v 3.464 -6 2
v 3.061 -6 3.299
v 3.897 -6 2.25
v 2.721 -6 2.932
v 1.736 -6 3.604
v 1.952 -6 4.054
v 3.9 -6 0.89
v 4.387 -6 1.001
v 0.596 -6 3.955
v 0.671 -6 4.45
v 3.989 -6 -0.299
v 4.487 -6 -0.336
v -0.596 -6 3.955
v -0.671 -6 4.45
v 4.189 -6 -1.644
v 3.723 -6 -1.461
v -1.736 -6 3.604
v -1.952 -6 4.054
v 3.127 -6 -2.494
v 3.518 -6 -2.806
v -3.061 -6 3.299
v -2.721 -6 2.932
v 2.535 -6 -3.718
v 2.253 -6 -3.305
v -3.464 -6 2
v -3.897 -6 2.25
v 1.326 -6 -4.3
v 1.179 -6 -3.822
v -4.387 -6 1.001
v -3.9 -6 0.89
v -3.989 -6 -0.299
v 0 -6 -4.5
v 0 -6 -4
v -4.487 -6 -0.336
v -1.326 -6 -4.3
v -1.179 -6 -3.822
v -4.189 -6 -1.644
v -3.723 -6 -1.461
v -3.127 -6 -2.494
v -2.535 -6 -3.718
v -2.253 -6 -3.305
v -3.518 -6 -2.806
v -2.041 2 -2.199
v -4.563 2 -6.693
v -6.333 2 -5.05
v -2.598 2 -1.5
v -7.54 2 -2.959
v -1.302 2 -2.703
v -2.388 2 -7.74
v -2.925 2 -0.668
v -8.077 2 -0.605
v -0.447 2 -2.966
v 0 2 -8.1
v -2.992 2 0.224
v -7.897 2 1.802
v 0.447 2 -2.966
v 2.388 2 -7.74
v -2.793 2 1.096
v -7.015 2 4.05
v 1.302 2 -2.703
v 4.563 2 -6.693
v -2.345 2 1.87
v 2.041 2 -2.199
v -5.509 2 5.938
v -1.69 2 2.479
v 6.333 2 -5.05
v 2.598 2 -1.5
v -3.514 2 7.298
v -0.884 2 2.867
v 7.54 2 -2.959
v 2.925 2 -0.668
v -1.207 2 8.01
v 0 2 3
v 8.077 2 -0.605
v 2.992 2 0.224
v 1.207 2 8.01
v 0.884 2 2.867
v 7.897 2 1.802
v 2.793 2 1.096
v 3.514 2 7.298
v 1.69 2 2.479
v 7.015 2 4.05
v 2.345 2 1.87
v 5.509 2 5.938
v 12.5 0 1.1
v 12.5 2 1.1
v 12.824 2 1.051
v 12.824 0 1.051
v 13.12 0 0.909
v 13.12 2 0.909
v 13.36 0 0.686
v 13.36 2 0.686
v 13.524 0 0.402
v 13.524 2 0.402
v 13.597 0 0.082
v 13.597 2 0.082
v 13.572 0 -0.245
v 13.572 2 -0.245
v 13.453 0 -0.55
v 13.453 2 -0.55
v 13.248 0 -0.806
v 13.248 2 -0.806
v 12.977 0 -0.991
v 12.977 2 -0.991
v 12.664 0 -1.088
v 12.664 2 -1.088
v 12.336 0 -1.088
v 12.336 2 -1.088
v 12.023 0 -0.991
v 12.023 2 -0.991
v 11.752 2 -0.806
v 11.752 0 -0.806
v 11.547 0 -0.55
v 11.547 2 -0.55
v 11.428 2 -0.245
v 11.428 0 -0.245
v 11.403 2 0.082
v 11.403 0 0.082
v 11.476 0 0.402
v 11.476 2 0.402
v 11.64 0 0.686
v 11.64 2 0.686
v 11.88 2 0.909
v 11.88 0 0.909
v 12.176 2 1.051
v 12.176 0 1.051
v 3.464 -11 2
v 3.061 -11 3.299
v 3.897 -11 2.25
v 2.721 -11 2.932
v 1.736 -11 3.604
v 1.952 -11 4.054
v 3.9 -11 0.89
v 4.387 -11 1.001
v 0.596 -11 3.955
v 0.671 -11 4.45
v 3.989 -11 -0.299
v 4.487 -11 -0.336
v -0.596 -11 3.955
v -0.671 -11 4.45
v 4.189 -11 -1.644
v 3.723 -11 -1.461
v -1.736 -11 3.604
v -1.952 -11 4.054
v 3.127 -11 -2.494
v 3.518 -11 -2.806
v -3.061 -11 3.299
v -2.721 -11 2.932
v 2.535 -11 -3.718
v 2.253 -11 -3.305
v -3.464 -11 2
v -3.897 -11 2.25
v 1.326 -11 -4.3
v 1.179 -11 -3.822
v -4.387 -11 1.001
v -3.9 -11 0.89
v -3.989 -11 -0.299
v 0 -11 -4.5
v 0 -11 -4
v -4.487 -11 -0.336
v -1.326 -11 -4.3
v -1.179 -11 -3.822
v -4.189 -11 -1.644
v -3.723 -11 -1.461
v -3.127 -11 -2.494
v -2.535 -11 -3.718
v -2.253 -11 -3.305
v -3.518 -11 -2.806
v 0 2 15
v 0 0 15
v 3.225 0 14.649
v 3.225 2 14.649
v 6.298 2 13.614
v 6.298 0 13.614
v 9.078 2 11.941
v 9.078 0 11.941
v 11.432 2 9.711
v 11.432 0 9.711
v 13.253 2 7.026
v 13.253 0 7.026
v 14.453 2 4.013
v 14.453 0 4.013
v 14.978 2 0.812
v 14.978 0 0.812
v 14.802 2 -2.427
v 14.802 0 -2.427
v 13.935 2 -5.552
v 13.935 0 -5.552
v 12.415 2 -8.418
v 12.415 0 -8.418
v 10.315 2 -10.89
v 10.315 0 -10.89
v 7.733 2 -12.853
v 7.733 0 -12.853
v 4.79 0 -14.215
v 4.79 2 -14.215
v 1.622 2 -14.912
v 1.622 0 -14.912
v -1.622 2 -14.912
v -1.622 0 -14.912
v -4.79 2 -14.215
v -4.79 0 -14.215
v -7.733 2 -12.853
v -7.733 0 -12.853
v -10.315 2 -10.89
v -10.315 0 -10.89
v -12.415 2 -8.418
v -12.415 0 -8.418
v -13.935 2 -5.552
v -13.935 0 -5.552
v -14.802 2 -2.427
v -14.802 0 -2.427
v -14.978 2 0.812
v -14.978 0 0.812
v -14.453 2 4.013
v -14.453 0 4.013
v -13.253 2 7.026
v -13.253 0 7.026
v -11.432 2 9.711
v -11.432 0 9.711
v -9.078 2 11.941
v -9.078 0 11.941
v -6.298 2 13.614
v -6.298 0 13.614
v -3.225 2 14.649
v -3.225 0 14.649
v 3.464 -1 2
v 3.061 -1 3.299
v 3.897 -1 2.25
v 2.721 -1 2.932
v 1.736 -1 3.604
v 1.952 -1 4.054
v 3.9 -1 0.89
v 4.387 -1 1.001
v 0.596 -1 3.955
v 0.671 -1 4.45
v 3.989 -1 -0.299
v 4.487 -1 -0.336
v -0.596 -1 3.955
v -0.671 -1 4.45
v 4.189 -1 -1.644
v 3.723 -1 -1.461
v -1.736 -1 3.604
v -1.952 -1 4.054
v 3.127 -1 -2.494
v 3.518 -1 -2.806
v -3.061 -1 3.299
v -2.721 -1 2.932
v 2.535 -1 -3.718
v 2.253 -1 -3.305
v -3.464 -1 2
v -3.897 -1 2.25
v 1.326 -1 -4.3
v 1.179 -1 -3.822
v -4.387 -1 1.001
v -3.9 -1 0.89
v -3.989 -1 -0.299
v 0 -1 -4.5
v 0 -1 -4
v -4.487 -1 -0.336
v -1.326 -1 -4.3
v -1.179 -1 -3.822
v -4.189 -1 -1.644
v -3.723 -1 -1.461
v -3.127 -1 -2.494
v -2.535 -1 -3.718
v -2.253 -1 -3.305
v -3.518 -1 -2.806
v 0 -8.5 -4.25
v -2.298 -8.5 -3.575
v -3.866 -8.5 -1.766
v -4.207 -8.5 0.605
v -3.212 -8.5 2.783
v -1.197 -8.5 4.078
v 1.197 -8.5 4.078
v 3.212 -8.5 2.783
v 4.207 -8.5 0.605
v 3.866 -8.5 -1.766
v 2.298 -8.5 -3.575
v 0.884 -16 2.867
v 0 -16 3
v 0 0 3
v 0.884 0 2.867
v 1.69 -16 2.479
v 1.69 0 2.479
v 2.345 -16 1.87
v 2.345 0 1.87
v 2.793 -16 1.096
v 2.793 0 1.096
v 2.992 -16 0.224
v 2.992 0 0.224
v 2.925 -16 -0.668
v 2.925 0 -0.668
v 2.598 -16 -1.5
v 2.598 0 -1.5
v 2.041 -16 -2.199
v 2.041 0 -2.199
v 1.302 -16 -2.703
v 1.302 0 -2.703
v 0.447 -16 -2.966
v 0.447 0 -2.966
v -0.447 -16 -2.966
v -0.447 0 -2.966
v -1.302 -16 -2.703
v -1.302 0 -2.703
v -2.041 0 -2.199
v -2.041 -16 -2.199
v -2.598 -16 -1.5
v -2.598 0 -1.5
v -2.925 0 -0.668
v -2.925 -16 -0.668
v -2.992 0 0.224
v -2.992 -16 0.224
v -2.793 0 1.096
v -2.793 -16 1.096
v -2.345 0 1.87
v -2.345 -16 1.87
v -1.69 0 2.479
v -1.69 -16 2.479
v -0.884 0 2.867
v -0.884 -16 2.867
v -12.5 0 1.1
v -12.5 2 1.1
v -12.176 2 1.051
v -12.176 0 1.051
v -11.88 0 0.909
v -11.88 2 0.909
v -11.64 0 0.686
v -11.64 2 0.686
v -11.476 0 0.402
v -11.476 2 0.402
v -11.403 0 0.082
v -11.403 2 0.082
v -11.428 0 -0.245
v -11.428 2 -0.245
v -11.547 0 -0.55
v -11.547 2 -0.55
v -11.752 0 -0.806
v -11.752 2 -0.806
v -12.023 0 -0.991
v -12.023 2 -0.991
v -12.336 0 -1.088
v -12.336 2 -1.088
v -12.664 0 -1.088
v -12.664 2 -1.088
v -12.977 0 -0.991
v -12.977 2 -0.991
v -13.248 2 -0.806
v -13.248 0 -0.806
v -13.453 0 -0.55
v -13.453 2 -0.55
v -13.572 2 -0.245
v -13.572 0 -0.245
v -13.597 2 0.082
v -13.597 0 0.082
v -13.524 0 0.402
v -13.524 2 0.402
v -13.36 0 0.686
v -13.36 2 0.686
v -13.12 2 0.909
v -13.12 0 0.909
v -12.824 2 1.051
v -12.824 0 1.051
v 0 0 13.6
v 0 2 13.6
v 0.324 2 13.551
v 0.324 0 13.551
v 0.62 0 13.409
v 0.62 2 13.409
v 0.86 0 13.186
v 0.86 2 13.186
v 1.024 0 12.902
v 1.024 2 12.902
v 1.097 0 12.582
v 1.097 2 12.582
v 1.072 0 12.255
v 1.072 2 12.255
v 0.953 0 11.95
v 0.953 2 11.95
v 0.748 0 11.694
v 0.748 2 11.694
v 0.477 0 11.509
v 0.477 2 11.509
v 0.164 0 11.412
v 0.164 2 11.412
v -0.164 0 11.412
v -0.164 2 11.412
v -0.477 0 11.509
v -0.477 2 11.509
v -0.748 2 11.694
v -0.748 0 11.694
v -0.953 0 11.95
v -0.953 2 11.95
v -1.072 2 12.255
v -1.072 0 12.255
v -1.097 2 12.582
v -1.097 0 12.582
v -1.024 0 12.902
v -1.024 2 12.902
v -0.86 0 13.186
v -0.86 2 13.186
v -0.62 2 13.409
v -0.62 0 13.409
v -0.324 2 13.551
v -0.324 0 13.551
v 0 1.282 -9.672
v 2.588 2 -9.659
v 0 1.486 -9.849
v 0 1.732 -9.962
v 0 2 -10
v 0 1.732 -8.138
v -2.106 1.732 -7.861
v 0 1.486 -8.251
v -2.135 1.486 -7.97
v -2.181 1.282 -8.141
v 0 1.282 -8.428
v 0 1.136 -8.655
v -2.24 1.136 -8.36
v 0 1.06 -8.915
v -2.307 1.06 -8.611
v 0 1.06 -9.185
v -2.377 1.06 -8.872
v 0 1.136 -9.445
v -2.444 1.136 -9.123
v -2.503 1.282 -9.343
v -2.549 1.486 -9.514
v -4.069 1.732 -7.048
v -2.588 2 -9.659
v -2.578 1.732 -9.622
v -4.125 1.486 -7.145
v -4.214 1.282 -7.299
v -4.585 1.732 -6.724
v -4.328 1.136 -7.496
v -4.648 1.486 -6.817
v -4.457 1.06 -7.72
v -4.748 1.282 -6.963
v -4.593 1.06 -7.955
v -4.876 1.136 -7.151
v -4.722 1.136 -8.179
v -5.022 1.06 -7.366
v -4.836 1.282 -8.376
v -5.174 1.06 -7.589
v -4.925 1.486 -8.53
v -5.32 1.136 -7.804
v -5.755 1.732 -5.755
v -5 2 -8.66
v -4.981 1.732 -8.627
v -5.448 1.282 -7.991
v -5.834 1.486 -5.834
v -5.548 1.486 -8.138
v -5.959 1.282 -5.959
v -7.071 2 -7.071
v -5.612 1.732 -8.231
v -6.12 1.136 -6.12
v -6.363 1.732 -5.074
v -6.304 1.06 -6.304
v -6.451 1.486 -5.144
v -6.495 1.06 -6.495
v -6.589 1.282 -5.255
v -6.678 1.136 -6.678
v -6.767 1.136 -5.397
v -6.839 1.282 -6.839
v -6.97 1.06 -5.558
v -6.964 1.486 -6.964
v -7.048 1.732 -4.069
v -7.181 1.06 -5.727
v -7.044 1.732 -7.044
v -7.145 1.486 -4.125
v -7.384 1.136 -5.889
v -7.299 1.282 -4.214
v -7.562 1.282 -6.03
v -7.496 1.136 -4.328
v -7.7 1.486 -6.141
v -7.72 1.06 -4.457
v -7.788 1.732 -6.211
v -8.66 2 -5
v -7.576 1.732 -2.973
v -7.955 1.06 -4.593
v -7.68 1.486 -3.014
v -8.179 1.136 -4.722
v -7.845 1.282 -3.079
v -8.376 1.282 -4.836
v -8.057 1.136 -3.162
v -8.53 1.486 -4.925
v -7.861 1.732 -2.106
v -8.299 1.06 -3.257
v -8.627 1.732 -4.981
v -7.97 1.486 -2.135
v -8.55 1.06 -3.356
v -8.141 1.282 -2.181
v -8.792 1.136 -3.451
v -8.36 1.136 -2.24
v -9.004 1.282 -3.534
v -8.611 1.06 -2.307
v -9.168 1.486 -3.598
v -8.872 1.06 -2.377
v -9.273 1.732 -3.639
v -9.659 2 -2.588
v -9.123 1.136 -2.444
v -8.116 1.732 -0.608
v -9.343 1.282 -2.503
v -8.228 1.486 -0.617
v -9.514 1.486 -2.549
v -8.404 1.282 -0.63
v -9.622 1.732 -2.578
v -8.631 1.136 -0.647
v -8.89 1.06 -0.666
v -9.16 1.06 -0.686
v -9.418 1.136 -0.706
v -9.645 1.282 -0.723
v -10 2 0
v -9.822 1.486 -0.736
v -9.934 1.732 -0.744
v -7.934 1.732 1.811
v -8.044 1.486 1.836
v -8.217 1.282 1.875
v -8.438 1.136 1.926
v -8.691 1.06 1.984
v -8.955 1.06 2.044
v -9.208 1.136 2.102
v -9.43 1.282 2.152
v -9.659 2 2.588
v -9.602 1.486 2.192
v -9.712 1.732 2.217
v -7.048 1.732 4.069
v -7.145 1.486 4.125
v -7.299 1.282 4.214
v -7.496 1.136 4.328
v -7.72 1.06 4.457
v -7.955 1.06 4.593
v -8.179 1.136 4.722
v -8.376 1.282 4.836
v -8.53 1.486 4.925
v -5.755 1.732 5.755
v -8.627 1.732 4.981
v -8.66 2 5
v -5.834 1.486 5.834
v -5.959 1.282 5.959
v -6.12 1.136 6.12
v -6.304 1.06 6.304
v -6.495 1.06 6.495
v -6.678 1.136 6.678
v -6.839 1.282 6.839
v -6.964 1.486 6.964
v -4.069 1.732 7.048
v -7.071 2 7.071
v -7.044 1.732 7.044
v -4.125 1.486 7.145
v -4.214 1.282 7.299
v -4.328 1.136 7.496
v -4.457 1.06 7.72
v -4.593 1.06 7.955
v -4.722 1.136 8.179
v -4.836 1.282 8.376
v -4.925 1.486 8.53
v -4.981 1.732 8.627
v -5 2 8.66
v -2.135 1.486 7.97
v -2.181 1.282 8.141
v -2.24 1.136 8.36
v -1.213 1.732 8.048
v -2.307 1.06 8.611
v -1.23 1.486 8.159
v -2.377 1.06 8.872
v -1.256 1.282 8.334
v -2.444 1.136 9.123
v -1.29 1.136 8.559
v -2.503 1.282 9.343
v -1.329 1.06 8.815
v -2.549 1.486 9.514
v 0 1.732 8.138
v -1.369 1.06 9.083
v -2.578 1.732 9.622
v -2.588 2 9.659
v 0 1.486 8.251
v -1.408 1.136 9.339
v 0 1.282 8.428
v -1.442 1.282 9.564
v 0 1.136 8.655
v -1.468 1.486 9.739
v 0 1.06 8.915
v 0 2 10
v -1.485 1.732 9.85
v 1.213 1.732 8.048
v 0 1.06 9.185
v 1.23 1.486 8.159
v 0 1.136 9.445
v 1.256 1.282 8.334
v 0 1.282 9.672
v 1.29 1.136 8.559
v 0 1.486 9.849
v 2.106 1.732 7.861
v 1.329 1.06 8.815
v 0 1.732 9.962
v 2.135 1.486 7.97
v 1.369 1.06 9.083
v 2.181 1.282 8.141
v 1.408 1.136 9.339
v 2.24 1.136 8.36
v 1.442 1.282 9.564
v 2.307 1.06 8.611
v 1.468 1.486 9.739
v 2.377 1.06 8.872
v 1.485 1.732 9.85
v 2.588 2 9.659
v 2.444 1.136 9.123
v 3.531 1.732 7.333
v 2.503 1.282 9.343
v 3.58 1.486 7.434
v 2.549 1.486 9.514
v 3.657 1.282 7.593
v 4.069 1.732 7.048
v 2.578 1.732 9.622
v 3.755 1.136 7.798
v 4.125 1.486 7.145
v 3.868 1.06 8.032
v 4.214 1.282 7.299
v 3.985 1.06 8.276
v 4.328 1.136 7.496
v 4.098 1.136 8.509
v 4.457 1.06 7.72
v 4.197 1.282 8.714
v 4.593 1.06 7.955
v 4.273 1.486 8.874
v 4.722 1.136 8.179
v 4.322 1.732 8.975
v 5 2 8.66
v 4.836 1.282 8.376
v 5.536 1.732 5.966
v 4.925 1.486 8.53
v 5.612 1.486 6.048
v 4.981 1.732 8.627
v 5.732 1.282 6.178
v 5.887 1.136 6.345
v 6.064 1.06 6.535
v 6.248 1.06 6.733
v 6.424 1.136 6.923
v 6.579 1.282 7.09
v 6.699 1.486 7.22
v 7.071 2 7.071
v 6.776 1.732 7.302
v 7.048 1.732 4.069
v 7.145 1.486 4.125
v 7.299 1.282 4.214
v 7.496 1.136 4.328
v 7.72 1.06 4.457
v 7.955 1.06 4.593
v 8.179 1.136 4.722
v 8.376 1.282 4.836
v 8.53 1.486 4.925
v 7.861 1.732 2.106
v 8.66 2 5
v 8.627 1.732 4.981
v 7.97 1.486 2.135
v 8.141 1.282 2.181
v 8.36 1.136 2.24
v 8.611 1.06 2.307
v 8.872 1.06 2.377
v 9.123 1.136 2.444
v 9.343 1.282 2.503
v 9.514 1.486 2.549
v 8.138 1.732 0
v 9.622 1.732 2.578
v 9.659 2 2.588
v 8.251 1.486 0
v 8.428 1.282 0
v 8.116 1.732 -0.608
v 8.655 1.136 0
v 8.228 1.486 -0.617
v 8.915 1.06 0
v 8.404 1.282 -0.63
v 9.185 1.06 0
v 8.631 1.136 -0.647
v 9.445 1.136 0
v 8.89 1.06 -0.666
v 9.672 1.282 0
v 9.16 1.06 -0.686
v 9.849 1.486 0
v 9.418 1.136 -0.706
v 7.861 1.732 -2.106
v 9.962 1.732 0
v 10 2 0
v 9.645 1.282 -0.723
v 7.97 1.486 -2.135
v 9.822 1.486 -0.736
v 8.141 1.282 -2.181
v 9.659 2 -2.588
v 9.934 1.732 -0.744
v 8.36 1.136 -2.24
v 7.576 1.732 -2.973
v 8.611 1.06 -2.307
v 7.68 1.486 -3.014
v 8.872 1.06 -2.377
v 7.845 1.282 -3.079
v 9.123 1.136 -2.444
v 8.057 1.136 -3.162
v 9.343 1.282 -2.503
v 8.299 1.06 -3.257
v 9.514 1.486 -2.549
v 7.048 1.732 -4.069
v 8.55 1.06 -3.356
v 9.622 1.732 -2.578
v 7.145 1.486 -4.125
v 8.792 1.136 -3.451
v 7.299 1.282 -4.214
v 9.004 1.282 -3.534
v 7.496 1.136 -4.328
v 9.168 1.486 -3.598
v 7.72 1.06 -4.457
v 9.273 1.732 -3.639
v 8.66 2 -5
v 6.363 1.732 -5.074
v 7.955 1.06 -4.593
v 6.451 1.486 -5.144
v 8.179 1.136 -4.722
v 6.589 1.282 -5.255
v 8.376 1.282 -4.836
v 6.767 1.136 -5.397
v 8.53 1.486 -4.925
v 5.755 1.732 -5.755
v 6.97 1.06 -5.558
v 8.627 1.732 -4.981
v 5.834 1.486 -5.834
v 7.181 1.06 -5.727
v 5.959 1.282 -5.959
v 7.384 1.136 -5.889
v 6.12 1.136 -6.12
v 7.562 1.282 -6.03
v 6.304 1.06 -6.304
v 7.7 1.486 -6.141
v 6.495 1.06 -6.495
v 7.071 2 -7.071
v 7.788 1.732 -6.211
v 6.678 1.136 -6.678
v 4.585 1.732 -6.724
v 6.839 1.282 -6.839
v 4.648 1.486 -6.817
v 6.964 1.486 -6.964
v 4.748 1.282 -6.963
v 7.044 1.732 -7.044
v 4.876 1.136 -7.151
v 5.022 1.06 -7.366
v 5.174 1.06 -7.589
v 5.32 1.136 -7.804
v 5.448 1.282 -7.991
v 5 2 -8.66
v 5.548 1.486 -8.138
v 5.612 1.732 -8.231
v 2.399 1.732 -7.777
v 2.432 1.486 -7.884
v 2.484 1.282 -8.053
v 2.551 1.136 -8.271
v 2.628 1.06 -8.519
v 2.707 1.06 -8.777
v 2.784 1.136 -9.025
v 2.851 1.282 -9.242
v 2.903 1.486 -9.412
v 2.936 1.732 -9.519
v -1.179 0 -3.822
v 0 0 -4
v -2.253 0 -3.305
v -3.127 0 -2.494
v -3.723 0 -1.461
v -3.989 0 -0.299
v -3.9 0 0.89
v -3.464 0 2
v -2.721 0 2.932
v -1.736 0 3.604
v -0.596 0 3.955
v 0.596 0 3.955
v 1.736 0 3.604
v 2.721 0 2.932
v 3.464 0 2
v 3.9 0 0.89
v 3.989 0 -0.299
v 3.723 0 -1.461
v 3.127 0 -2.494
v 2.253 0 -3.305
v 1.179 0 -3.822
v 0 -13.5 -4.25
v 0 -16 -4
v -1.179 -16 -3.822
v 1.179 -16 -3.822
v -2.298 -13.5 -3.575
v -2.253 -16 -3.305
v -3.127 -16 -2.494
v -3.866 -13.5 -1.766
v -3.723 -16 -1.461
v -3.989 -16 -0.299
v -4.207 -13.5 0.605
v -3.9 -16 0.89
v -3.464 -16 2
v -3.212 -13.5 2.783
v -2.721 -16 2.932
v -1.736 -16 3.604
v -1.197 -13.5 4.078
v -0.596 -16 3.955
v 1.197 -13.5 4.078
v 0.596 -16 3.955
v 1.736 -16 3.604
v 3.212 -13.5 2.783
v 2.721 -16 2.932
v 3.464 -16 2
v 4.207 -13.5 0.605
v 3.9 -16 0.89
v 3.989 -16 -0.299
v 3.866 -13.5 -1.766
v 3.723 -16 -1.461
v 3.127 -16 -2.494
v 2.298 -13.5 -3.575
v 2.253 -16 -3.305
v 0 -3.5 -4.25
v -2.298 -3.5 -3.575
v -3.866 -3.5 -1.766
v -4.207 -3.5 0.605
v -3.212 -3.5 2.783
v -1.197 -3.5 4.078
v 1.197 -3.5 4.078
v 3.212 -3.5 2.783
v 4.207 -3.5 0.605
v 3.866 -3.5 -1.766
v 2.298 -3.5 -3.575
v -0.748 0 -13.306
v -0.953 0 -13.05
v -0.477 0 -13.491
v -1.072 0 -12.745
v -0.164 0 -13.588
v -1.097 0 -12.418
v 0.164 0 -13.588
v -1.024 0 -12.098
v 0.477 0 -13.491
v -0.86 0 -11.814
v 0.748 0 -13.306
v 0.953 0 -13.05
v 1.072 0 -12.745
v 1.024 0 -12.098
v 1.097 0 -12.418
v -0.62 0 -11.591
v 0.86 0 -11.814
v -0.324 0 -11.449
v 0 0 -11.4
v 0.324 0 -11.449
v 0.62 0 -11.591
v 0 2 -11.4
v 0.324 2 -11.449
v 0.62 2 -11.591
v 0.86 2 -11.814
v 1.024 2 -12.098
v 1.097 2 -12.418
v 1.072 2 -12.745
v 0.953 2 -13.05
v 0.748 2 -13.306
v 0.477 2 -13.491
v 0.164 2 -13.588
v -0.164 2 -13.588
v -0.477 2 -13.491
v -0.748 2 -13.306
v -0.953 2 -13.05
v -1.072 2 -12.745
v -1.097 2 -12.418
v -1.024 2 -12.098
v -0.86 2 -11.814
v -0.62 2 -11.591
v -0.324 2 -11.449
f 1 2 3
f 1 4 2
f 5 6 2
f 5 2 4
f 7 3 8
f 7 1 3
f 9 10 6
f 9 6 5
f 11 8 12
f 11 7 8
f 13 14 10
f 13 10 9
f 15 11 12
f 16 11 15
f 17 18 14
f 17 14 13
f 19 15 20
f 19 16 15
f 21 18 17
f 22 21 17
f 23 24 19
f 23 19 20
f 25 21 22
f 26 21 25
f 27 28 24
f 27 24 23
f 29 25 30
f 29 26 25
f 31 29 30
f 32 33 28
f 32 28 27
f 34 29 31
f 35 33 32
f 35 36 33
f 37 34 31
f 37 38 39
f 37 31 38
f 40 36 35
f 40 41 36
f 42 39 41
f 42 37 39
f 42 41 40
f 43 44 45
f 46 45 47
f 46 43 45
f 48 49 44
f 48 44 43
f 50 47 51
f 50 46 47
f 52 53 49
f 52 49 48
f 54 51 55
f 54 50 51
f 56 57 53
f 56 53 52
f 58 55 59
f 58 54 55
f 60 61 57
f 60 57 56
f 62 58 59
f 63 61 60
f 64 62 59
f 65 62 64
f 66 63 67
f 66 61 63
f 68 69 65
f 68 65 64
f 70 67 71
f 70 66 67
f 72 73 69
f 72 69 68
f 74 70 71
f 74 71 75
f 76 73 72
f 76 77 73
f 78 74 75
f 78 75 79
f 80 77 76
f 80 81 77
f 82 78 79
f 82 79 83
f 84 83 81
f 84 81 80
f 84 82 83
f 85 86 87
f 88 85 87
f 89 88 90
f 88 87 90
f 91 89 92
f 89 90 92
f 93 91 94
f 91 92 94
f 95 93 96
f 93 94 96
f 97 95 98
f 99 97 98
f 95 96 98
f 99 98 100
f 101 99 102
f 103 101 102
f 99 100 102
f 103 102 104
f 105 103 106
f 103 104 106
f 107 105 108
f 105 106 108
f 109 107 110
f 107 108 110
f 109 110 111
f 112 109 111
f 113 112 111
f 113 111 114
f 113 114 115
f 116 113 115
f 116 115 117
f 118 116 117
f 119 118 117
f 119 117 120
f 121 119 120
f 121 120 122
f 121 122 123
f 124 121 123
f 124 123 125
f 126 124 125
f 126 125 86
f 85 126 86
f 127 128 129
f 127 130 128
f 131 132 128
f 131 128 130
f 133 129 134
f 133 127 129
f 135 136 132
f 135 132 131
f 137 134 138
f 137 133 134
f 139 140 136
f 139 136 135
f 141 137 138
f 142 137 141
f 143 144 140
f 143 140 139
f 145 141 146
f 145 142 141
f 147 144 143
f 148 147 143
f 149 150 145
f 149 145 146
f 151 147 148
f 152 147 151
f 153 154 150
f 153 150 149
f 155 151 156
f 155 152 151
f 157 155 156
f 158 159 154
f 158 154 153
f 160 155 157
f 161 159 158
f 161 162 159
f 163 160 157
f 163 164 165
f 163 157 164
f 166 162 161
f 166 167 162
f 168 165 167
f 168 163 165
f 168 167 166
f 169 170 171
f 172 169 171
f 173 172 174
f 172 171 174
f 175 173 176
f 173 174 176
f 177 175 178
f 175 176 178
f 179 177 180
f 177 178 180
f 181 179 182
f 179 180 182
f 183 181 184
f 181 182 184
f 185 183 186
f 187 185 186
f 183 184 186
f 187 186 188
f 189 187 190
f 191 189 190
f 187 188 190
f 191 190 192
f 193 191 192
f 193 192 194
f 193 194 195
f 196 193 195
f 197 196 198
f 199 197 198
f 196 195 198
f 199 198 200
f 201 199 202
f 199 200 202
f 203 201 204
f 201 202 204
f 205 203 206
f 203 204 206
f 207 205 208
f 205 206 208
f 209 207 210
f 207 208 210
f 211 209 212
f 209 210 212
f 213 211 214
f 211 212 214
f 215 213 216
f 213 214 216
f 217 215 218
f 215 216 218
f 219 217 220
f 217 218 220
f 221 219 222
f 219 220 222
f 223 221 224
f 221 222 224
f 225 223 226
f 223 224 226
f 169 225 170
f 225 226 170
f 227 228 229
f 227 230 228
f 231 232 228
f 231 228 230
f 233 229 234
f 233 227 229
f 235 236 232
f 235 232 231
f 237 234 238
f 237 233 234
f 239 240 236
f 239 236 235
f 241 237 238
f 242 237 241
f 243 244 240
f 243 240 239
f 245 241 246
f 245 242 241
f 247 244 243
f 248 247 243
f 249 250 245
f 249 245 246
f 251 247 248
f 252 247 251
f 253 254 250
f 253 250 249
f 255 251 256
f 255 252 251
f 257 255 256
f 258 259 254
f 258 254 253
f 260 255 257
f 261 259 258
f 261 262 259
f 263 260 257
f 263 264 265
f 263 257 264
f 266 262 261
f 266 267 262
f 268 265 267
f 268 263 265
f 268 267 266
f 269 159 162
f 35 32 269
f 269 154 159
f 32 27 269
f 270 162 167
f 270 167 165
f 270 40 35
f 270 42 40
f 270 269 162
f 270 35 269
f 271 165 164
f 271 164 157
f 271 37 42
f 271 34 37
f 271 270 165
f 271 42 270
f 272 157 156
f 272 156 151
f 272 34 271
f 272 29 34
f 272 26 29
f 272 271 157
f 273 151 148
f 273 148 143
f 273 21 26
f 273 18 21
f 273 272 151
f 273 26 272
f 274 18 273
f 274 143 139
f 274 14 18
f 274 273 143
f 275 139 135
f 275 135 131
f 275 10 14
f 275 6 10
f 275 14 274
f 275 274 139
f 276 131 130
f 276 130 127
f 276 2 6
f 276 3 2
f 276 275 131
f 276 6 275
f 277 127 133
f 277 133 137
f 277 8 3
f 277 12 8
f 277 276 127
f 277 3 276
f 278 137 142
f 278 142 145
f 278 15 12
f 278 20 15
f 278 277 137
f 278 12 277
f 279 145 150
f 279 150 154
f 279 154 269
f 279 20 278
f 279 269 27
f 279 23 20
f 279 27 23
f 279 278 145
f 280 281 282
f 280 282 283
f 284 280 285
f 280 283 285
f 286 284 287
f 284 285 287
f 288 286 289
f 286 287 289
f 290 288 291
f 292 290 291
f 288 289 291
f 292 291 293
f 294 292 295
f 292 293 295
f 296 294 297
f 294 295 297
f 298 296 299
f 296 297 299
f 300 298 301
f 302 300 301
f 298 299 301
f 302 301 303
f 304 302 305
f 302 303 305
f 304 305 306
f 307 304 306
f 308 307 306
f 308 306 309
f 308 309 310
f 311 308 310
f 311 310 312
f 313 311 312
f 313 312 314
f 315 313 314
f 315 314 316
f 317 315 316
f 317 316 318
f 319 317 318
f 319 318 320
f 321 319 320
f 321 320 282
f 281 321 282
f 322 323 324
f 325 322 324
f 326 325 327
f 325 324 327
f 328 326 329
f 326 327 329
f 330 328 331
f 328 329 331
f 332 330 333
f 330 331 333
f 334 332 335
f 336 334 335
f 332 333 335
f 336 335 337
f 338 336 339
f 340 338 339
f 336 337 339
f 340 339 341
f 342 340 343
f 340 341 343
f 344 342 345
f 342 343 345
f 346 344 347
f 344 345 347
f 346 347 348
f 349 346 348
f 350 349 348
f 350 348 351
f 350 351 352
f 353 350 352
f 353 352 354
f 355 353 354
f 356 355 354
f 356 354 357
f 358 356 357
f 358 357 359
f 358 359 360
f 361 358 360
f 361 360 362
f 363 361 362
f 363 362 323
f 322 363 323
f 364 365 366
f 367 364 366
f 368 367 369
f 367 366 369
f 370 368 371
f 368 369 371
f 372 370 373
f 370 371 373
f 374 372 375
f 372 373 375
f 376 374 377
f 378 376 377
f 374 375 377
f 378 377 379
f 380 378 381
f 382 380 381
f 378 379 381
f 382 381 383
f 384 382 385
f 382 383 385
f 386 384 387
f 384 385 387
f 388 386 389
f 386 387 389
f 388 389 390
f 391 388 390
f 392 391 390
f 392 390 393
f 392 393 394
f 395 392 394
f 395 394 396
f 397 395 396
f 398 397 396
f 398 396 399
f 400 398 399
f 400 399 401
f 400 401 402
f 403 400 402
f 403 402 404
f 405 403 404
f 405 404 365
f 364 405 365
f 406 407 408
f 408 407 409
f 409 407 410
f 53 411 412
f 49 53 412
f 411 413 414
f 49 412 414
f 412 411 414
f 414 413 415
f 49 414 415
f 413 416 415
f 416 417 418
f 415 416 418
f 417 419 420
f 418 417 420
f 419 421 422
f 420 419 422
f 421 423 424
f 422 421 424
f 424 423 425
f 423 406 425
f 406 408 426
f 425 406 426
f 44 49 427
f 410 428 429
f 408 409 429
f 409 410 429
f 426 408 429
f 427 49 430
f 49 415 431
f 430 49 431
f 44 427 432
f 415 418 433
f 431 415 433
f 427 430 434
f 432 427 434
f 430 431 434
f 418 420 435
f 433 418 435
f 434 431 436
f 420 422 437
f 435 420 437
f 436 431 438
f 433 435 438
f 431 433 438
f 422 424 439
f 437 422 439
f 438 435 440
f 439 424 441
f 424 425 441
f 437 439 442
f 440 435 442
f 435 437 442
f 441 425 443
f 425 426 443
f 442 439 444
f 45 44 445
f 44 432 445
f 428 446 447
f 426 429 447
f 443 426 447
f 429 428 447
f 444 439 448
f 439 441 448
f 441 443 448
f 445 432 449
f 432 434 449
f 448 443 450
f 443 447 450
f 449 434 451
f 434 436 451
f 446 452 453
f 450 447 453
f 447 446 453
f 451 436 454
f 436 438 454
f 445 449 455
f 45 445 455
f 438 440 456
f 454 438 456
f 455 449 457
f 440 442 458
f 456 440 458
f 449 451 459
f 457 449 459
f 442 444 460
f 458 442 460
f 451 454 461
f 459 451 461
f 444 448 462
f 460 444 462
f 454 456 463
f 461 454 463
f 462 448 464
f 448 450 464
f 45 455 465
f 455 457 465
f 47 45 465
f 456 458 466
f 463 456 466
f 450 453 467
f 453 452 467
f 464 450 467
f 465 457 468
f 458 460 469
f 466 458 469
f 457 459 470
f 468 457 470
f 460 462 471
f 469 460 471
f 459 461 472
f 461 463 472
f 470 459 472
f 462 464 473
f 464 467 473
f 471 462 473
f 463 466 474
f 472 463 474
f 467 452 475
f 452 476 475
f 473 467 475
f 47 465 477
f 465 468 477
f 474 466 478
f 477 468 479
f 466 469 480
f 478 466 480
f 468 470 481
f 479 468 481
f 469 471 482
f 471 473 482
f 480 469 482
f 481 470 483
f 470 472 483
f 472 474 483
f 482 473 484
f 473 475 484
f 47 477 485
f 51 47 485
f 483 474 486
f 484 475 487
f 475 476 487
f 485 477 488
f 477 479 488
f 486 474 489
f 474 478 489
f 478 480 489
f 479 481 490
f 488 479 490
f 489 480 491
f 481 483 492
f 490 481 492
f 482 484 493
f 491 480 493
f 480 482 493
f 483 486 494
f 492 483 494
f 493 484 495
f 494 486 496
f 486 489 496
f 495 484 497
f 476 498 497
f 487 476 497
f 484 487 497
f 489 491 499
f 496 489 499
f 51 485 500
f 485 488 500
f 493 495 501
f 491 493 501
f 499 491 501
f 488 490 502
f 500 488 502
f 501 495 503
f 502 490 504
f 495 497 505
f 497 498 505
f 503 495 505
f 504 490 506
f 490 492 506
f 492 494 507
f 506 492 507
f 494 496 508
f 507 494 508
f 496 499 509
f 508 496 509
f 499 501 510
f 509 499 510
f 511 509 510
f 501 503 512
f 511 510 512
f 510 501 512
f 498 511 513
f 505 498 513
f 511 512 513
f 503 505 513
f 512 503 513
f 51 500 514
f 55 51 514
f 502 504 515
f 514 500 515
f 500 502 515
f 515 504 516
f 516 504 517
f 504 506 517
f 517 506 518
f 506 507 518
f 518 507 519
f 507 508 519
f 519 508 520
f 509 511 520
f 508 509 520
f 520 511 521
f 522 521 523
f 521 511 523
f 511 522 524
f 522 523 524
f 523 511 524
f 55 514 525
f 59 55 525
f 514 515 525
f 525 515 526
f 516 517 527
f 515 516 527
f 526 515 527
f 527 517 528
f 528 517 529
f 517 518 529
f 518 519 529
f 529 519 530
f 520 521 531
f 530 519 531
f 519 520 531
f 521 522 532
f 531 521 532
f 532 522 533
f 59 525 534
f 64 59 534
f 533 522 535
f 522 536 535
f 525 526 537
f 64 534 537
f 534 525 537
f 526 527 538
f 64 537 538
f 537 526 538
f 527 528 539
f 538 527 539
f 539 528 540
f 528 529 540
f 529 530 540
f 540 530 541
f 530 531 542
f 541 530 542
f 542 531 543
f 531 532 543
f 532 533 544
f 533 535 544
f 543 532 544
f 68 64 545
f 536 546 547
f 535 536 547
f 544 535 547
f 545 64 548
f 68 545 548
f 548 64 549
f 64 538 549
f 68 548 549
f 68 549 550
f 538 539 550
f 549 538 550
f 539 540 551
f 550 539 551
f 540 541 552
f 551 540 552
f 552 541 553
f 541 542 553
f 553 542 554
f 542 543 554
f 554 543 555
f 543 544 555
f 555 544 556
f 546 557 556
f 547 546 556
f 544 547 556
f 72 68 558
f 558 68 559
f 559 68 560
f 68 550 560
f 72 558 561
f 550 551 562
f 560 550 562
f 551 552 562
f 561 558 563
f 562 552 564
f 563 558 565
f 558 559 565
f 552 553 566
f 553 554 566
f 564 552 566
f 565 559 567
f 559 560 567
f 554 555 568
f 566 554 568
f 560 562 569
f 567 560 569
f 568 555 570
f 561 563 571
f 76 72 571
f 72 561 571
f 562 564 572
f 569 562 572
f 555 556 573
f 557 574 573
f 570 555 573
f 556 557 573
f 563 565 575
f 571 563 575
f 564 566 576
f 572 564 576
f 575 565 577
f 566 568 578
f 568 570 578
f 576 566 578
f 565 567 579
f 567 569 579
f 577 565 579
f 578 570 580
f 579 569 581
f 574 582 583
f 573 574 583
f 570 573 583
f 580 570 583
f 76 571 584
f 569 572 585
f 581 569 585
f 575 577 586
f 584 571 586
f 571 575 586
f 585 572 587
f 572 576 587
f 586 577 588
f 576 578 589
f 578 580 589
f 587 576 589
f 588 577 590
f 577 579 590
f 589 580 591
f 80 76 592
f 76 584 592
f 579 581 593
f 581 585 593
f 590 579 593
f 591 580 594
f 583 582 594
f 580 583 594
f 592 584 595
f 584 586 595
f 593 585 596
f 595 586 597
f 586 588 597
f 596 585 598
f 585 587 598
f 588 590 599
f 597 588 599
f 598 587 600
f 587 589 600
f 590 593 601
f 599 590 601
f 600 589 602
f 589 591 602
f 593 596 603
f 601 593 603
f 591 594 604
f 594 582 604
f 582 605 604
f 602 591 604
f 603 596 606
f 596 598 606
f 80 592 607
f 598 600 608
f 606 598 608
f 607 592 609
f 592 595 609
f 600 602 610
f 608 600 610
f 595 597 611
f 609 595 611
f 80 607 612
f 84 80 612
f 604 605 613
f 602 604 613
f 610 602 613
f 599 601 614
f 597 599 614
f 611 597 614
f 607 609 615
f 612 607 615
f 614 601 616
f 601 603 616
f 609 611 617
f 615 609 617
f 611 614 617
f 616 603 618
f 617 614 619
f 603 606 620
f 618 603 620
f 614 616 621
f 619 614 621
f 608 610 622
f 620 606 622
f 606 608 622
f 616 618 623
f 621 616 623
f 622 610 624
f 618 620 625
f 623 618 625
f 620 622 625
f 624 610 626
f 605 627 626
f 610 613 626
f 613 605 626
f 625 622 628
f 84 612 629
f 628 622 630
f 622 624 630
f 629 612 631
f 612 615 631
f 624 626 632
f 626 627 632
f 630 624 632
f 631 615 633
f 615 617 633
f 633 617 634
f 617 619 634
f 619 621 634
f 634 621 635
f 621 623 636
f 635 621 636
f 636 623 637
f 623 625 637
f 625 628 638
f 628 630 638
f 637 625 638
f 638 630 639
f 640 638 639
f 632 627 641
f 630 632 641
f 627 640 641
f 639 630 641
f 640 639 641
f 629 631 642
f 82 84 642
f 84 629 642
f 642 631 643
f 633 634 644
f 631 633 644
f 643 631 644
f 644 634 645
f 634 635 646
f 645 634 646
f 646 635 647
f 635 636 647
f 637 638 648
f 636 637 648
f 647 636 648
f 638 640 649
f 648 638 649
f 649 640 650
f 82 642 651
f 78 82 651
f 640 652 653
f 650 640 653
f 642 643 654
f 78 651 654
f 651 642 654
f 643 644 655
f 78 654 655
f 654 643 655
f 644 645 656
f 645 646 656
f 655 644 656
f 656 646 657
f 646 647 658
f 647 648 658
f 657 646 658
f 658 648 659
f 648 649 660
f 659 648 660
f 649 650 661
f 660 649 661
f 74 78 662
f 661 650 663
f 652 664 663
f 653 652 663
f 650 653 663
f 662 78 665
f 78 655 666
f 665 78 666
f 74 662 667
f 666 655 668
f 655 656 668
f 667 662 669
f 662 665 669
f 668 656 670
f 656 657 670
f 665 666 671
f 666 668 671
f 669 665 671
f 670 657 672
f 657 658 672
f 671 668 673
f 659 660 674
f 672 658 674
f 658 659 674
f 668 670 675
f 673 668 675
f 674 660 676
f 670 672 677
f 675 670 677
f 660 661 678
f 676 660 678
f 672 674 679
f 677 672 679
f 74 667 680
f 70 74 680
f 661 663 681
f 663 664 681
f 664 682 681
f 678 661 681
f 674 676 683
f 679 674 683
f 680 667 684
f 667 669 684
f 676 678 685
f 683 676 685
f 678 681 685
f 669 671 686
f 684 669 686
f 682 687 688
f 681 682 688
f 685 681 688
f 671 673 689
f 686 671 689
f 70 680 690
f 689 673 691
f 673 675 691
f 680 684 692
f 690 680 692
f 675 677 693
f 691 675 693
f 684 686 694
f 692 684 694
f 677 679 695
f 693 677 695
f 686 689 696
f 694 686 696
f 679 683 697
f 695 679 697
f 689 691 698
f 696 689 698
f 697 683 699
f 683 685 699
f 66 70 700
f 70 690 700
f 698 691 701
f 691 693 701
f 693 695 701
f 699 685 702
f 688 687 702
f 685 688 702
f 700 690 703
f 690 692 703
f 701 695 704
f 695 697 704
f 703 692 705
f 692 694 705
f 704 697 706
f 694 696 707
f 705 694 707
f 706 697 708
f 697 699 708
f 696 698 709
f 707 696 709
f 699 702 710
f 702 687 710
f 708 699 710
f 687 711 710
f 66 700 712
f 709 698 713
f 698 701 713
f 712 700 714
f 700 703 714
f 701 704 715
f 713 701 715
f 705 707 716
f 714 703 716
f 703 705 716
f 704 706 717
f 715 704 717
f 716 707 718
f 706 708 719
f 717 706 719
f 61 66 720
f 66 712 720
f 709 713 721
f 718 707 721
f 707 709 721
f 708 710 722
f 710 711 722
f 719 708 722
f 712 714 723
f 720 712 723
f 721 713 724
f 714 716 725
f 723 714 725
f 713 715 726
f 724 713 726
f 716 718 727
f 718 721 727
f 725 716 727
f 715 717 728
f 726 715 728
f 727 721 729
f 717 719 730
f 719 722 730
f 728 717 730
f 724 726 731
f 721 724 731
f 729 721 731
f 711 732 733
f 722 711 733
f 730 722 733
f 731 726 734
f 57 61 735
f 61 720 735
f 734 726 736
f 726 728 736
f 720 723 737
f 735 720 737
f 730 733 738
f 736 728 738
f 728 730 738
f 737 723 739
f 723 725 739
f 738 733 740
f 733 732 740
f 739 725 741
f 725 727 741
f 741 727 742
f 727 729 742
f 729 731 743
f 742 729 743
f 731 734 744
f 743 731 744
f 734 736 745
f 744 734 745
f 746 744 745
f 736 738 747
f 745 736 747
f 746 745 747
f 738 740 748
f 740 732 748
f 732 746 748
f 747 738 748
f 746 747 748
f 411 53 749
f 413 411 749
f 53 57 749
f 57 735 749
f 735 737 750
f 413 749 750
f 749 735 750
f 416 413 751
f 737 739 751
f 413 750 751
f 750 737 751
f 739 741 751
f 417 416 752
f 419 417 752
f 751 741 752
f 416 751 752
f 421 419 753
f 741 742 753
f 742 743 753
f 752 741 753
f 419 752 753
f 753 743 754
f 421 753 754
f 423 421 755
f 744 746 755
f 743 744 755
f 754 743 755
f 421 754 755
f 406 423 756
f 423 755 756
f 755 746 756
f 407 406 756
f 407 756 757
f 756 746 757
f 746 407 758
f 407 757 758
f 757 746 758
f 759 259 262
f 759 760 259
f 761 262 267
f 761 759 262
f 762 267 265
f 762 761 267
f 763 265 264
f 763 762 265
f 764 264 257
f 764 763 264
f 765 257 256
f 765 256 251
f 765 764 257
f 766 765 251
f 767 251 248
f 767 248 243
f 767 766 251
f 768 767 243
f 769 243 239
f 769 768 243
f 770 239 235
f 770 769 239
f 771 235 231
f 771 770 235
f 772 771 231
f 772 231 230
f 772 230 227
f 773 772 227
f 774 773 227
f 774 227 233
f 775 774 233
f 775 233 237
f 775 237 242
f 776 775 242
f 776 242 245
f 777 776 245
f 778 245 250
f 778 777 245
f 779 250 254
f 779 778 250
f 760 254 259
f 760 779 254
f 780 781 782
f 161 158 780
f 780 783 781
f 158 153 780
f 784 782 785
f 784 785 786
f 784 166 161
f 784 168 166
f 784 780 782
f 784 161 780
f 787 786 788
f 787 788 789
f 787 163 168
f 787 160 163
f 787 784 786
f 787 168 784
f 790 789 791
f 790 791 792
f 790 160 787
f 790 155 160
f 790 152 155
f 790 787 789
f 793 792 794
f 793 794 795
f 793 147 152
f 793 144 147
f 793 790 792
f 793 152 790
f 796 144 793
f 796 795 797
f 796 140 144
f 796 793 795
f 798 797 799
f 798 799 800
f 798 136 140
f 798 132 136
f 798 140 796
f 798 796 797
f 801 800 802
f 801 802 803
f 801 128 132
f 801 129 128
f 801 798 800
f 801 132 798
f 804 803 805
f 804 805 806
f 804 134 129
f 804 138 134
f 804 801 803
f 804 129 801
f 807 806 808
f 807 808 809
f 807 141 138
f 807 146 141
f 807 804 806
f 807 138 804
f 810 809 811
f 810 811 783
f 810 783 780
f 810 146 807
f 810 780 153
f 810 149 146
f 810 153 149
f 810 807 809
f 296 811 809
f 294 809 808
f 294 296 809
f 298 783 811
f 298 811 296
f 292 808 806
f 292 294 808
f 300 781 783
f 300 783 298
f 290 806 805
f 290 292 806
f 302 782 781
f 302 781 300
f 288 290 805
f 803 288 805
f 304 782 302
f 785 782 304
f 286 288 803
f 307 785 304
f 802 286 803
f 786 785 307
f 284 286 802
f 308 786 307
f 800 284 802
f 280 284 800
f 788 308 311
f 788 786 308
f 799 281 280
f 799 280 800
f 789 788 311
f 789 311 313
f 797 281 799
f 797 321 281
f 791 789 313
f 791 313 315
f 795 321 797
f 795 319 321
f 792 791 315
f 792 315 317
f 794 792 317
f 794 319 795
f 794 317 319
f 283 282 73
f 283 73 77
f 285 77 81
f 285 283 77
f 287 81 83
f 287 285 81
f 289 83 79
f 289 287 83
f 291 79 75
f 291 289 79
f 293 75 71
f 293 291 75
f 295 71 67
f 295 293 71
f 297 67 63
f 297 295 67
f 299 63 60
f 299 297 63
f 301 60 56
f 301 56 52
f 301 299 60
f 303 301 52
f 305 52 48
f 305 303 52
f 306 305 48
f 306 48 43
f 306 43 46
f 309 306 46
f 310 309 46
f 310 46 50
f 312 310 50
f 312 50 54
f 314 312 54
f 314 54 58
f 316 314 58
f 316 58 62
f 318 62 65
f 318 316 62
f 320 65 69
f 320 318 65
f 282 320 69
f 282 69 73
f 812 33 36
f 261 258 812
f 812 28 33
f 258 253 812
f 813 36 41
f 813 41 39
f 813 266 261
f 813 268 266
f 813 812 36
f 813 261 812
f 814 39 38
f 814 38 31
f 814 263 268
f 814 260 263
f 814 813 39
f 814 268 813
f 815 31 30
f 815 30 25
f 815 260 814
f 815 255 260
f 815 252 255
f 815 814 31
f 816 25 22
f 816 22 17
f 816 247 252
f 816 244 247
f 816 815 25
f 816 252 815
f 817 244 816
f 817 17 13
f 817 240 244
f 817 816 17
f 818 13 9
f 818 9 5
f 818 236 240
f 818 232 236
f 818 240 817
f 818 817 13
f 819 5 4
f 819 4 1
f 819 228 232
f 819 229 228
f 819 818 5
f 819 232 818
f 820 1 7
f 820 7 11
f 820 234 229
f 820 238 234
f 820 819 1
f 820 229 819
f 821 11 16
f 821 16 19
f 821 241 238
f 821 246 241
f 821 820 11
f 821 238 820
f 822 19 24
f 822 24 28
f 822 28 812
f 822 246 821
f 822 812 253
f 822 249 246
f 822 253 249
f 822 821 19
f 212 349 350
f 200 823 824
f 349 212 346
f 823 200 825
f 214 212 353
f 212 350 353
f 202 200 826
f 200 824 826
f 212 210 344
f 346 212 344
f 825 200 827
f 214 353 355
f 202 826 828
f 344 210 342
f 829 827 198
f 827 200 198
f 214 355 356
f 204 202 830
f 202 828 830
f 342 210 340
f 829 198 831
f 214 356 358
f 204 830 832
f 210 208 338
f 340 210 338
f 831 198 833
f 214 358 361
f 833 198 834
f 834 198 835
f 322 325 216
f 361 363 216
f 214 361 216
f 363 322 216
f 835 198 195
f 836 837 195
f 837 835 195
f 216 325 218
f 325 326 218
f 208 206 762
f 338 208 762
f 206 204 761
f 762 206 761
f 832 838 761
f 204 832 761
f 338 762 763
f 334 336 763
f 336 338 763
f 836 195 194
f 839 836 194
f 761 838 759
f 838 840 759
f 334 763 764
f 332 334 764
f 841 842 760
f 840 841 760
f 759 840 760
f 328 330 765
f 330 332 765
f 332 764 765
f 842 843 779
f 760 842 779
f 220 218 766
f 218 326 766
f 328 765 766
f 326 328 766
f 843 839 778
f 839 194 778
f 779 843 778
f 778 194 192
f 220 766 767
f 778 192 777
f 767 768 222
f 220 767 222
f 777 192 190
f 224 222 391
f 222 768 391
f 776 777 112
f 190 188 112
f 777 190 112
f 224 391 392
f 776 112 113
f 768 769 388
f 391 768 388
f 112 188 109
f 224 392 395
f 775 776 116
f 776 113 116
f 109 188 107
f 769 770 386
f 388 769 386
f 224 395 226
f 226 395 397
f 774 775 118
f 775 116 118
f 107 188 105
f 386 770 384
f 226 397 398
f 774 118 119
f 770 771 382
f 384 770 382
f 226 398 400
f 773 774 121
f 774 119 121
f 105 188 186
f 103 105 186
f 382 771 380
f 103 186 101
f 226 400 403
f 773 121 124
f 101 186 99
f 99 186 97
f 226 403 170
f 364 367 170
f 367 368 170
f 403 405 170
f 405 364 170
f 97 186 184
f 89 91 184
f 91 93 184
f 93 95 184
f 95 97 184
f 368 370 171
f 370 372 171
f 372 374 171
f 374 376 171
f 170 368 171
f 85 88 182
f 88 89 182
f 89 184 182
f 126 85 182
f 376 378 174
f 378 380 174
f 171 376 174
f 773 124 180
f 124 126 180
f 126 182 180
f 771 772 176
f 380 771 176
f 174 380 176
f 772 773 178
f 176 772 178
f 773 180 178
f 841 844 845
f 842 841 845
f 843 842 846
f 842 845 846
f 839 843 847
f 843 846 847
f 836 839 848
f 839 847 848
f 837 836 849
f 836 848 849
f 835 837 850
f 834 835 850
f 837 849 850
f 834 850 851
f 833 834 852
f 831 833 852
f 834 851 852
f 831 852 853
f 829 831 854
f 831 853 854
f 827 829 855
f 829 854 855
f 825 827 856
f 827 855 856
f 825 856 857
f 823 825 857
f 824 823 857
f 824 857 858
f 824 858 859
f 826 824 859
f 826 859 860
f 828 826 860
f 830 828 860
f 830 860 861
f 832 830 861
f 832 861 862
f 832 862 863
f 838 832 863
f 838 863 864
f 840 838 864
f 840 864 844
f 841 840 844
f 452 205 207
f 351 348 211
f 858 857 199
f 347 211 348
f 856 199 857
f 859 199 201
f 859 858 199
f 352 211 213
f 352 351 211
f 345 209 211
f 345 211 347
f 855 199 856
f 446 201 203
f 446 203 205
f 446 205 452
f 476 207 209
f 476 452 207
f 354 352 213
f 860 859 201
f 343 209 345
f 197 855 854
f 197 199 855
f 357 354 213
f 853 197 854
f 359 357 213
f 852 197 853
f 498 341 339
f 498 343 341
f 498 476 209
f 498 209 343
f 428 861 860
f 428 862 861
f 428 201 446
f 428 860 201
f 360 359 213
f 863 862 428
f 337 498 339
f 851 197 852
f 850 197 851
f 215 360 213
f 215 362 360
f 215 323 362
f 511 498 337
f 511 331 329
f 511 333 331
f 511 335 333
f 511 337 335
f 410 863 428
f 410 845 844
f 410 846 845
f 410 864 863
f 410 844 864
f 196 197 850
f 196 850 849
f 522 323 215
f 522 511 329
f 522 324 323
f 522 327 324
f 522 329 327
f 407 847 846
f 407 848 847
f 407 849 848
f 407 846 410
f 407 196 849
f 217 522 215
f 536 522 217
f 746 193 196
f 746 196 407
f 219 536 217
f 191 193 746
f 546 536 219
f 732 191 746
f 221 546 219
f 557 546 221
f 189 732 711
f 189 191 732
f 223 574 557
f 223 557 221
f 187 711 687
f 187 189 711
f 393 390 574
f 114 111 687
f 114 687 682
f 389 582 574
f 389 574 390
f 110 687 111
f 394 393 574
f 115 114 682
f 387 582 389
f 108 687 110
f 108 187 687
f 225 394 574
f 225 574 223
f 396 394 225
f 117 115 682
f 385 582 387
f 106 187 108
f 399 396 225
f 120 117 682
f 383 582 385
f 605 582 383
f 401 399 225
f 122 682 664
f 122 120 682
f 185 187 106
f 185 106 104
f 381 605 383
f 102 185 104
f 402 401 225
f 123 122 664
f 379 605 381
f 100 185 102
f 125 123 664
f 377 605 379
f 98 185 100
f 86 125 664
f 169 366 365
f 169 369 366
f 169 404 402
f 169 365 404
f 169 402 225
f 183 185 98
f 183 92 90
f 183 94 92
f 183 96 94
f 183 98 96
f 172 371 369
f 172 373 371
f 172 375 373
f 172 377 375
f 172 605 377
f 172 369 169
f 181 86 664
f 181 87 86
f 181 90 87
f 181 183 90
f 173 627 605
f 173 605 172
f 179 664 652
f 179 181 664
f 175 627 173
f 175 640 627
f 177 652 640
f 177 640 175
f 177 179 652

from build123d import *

# Parameters (mm, degrees)
SKETCH_1_R          = 15
SKETCH_1_R_2        = 3
EXTRUDE_1_DEPTH     = 2
SKETCH_2_R          = 0.95
CUT_EXTRUDE_1_REACH = 23.307
SKETCH_3_R          = 1.1
CUT_EXTRUDE_2_REACH = 28.571
SKETCH_5_R          = 3


with BuildPart() as part:
    # 草图1 → 凸台-拉伸1 (new body)
    with BuildSketch(Plane(origin=(0, 0, 0), x_dir=(1, 0, 0), z_dir=(0, 1, 0))):
        with Locations(Location((0, 0, 0), (0, 0, 270))):
            Circle(SKETCH_1_R)
        with Locations(Location((0, 0, 0), (0, 0, 270))):
            Circle(SKETCH_1_R_2, mode=Mode.SUBTRACT)
    extrude(amount=EXTRUDE_1_DEPTH)

    # 草图2 → 切除-旋转1 (revolve, cut)
    with BuildSketch(Plane.XY, mode=Mode.PRIVATE) as cut_revolve_1_sk:
        with Locations((9.05, 2)):
            Circle(SKETCH_2_R)
    revolve(cut_revolve_1_sk.sketch.rotate(Axis((0, 2, 0), (0, 1, 0)), 90), axis=Axis((0, 2, 0), (0, 1, 0)), mode=Mode.SUBTRACT)

    # 草图3 → 切除-拉伸1 (cut, up to next)
    with BuildSketch(Plane(origin=(0, 2, 0), x_dir=(1, 0, 0), z_dir=(0, 1, 0)), mode=Mode.PRIVATE) as cut_extrude_1_sk1:
        with Locations(Location((12.5, 0, 0), (0, 0, 270))):
            Circle(SKETCH_3_R)
    cut_extrude_1_tool1 = extrude(cut_extrude_1_sk1.sketch, amount=-CUT_EXTRUDE_1_REACH, mode=Mode.PRIVATE) & part.part
    # 草图3 → 切除-拉伸1 (cut, up to next)
    with BuildSketch(Plane(origin=(0, 2, 0), x_dir=(1, 0, 0), z_dir=(0, 1, 0)), mode=Mode.PRIVATE) as cut_extrude_1_sk2:
        with Locations(Location((0, -12.5, 0), (0, 0, 270))):
            Circle(SKETCH_3_R)
    cut_extrude_1_tool2 = extrude(cut_extrude_1_sk2.sketch, amount=-CUT_EXTRUDE_1_REACH, mode=Mode.PRIVATE) & part.part
    # 草图3 → 切除-拉伸1 (cut, up to next)
    with BuildSketch(Plane(origin=(0, 2, 0), x_dir=(1, 0, 0), z_dir=(0, 1, 0)), mode=Mode.PRIVATE) as cut_extrude_1_sk3:
        with Locations(Location((-12.5, 0, 0), (0, 0, 270))):
            Circle(SKETCH_3_R)
    cut_extrude_1_tool3 = extrude(cut_extrude_1_sk3.sketch, amount=-CUT_EXTRUDE_1_REACH, mode=Mode.PRIVATE) & part.part
    # 草图3 → 切除-拉伸1 (cut, up to next)
    with BuildSketch(Plane(origin=(0, 2, 0), x_dir=(1, 0, 0), z_dir=(0, 1, 0)), mode=Mode.PRIVATE) as cut_extrude_1_sk4:
        with Locations(Location((0, 12.5, 0), (0, 0, 270))):
            Circle(SKETCH_3_R)
    cut_extrude_1_tool4 = extrude(cut_extrude_1_sk4.sketch, amount=-CUT_EXTRUDE_1_REACH, mode=Mode.PRIVATE) & part.part
    add(cut_extrude_1_tool1.solids().sort_by_distance((12.5, 2, 0))[0], mode=Mode.SUBTRACT)
    add(cut_extrude_1_tool2.solids().sort_by_distance((0, 2, 12.5))[0], mode=Mode.SUBTRACT)
    add(cut_extrude_1_tool3.solids().sort_by_distance((-12.5, 2, 0))[0], mode=Mode.SUBTRACT)
    add(cut_extrude_1_tool4.solids().sort_by_distance((0, 2, -12.5))[0], mode=Mode.SUBTRACT)

    # 草图4 → 旋转1 (revolve)
    with BuildSketch(Plane(origin=(0, 0, 0), x_dir=(0, 0, -1), z_dir=(1, 0, 0))):
        Polygon((4, 0), (0, 0), (0, -16), (4, -16), (4.5, -11), (4, -11), (4.5, -6), (4, -6), (4.5, -1), (4, -1), align=None)
    revolve(axis=Axis((0, -16, 0), (0, 1, 0)))

    # 草图5 → 切除-拉伸2 (cut, up to next)
    with BuildSketch(Plane(origin=(0, 0, 0), x_dir=(1, 0, 0), z_dir=(0, 1, 0)), mode=Mode.PRIVATE) as cut_extrude_2_sk1:
        with Locations(Location((0, 0, 0), (0, 0, 270))):
            Circle(SKETCH_5_R)
    cut_extrude_2_tool1 = extrude(cut_extrude_2_sk1.sketch, amount=-CUT_EXTRUDE_2_REACH, mode=Mode.PRIVATE) & part.part
    add(cut_extrude_2_tool1.solids().sort_by_distance((0, 0, 0))[0], mode=Mode.SUBTRACT)


solid = part.part
